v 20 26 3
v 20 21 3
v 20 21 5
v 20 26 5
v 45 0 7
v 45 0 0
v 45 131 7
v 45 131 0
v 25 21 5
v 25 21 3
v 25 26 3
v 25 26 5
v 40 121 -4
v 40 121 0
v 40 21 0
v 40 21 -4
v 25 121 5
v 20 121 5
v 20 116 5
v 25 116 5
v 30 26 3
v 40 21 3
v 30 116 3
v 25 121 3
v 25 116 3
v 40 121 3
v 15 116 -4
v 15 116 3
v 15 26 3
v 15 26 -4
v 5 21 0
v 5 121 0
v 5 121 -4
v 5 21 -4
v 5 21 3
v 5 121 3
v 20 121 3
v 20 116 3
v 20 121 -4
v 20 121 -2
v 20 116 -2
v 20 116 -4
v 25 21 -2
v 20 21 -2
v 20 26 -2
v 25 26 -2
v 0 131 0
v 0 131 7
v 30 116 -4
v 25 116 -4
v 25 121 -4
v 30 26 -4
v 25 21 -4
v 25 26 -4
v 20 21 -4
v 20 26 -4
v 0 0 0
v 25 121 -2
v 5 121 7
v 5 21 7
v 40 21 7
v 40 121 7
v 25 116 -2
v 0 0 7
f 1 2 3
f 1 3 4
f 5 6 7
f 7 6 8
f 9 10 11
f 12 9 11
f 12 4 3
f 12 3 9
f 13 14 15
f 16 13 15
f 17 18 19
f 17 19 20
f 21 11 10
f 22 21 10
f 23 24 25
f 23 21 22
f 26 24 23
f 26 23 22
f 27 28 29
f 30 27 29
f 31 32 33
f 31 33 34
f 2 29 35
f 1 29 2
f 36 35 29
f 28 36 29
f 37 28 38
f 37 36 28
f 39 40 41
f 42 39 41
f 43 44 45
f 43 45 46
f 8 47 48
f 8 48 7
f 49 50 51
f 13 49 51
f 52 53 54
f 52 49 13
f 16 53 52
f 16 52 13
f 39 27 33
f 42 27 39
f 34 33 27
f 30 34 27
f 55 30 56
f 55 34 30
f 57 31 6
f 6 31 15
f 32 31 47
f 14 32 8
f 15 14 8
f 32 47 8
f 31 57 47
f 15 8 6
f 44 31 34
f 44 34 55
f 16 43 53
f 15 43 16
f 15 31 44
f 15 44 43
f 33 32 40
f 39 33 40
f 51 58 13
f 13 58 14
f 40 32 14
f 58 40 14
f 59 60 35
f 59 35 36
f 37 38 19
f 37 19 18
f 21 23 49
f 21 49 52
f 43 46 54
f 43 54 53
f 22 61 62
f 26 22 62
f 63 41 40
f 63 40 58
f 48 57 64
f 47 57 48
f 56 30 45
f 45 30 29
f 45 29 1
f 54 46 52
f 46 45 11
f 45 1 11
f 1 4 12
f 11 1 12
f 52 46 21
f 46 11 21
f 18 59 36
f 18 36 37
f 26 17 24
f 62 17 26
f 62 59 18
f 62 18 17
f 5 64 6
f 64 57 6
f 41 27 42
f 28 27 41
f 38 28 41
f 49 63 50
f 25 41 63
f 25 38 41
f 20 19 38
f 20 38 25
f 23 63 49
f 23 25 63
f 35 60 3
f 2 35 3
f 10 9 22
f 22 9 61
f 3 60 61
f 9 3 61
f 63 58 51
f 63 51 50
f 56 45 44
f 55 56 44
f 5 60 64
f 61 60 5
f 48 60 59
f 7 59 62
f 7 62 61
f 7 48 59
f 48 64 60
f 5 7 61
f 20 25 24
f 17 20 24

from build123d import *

# Parameters (mm, degrees)
F0_W      = 45
F0_H      = 131
F1_DEPTH  = 2
F2_W      = 45
F2_H      = 131
F3_DEPTH  = 5
F5_W      = 35
F5_H      = 100
F6_DEPTH  = 4
F7_W      = 5
F7_H      = 100
F8_DEPTH  = 2
F4_W      = 15
F4_H      = 90
F9_DEPTH  = 7.001
F10_W     = 5
F10_H     = 5
F13_DEPTH = 2
F12_W     = 5
F12_H     = 5
F14_DEPTH = 4
F11_W     = 10
F11_H     = 100
F15_DEPTH = 4


with BuildPart() as f1:
    # F0 (on Top) → F1 (new body)
    with BuildSketch(Plane.XY):
        with Locations((22.5, 65.5)):
            Rectangle(F0_W, F0_H)
    extrude(amount=F1_DEPTH)

    # F2 (on face) → F3 (join)
    with BuildSketch(Plane.XY.offset(2)):
        with Locations((22.5, 65.5)):
            Rectangle(F2_W, F2_H)
    extrude(amount=F3_DEPTH)

    # F5 (on face) → F6 (cut)
    with BuildSketch(Plane.XY.offset(7)):
        with Locations((22.5, 71)):
            Rectangle(F5_W, F5_H)
    extrude(amount=-F6_DEPTH, mode=Mode.SUBTRACT)

    # F7 (on face) → F8 (join)
    with BuildSketch(Plane.XY.offset(3)):
        with Locations((22.5, 71)):
            Rectangle(F7_W, F7_H)
    extrude(amount=F8_DEPTH)

    # F4 (on face) → F9 (cut, through all)
    with BuildSketch(Plane.XY.offset(7)):
        with Locations((22.5, 71)):
            Rectangle(F4_W, F4_H)
    extrude(amount=-F9_DEPTH, mode=Mode.SUBTRACT)

    # F10 (on face) → F13 (join)
    with BuildSketch(Plane(origin=(0, 0, 0), x_dir=(1, 0, 0), z_dir=(0, 0, -1))):
        with Locations((22.5, -118.5)):
            Rectangle(F10_W, F10_H)
        with Locations((22.5, -23.5)):
            Rectangle(F10_W, F10_H)
    extrude(amount=F13_DEPTH)

    # F12 (on face) → F14 (join)
    with BuildSketch(Plane(origin=(0, 0, 0), x_dir=(1, 0, 0), z_dir=(0, 0, -1))):
        with Locations((17.5, -23.5)):
            Rectangle(F12_W, F12_H)
        with Locations((27.5, -23.5)):
            Rectangle(F12_W, F12_H)
        with Locations((27.5, -118.5)):
            Rectangle(F12_W, F12_H)
        with Locations((17.5, -118.5)):
            Rectangle(F12_W, F12_H)
    extrude(amount=F14_DEPTH)

    # F11 (on face) → F15 (join)
    with BuildSketch(Plane(origin=(0, 0, 0), x_dir=(1, 0, 0), z_dir=(0, 0, -1))):
        with Locations((10, -71)):
            Rectangle(F11_W, F11_H)
        with Locations((35, -71)):
            Rectangle(F11_W, F11_H)
    extrude(amount=F15_DEPTH)


solid = f1.part
